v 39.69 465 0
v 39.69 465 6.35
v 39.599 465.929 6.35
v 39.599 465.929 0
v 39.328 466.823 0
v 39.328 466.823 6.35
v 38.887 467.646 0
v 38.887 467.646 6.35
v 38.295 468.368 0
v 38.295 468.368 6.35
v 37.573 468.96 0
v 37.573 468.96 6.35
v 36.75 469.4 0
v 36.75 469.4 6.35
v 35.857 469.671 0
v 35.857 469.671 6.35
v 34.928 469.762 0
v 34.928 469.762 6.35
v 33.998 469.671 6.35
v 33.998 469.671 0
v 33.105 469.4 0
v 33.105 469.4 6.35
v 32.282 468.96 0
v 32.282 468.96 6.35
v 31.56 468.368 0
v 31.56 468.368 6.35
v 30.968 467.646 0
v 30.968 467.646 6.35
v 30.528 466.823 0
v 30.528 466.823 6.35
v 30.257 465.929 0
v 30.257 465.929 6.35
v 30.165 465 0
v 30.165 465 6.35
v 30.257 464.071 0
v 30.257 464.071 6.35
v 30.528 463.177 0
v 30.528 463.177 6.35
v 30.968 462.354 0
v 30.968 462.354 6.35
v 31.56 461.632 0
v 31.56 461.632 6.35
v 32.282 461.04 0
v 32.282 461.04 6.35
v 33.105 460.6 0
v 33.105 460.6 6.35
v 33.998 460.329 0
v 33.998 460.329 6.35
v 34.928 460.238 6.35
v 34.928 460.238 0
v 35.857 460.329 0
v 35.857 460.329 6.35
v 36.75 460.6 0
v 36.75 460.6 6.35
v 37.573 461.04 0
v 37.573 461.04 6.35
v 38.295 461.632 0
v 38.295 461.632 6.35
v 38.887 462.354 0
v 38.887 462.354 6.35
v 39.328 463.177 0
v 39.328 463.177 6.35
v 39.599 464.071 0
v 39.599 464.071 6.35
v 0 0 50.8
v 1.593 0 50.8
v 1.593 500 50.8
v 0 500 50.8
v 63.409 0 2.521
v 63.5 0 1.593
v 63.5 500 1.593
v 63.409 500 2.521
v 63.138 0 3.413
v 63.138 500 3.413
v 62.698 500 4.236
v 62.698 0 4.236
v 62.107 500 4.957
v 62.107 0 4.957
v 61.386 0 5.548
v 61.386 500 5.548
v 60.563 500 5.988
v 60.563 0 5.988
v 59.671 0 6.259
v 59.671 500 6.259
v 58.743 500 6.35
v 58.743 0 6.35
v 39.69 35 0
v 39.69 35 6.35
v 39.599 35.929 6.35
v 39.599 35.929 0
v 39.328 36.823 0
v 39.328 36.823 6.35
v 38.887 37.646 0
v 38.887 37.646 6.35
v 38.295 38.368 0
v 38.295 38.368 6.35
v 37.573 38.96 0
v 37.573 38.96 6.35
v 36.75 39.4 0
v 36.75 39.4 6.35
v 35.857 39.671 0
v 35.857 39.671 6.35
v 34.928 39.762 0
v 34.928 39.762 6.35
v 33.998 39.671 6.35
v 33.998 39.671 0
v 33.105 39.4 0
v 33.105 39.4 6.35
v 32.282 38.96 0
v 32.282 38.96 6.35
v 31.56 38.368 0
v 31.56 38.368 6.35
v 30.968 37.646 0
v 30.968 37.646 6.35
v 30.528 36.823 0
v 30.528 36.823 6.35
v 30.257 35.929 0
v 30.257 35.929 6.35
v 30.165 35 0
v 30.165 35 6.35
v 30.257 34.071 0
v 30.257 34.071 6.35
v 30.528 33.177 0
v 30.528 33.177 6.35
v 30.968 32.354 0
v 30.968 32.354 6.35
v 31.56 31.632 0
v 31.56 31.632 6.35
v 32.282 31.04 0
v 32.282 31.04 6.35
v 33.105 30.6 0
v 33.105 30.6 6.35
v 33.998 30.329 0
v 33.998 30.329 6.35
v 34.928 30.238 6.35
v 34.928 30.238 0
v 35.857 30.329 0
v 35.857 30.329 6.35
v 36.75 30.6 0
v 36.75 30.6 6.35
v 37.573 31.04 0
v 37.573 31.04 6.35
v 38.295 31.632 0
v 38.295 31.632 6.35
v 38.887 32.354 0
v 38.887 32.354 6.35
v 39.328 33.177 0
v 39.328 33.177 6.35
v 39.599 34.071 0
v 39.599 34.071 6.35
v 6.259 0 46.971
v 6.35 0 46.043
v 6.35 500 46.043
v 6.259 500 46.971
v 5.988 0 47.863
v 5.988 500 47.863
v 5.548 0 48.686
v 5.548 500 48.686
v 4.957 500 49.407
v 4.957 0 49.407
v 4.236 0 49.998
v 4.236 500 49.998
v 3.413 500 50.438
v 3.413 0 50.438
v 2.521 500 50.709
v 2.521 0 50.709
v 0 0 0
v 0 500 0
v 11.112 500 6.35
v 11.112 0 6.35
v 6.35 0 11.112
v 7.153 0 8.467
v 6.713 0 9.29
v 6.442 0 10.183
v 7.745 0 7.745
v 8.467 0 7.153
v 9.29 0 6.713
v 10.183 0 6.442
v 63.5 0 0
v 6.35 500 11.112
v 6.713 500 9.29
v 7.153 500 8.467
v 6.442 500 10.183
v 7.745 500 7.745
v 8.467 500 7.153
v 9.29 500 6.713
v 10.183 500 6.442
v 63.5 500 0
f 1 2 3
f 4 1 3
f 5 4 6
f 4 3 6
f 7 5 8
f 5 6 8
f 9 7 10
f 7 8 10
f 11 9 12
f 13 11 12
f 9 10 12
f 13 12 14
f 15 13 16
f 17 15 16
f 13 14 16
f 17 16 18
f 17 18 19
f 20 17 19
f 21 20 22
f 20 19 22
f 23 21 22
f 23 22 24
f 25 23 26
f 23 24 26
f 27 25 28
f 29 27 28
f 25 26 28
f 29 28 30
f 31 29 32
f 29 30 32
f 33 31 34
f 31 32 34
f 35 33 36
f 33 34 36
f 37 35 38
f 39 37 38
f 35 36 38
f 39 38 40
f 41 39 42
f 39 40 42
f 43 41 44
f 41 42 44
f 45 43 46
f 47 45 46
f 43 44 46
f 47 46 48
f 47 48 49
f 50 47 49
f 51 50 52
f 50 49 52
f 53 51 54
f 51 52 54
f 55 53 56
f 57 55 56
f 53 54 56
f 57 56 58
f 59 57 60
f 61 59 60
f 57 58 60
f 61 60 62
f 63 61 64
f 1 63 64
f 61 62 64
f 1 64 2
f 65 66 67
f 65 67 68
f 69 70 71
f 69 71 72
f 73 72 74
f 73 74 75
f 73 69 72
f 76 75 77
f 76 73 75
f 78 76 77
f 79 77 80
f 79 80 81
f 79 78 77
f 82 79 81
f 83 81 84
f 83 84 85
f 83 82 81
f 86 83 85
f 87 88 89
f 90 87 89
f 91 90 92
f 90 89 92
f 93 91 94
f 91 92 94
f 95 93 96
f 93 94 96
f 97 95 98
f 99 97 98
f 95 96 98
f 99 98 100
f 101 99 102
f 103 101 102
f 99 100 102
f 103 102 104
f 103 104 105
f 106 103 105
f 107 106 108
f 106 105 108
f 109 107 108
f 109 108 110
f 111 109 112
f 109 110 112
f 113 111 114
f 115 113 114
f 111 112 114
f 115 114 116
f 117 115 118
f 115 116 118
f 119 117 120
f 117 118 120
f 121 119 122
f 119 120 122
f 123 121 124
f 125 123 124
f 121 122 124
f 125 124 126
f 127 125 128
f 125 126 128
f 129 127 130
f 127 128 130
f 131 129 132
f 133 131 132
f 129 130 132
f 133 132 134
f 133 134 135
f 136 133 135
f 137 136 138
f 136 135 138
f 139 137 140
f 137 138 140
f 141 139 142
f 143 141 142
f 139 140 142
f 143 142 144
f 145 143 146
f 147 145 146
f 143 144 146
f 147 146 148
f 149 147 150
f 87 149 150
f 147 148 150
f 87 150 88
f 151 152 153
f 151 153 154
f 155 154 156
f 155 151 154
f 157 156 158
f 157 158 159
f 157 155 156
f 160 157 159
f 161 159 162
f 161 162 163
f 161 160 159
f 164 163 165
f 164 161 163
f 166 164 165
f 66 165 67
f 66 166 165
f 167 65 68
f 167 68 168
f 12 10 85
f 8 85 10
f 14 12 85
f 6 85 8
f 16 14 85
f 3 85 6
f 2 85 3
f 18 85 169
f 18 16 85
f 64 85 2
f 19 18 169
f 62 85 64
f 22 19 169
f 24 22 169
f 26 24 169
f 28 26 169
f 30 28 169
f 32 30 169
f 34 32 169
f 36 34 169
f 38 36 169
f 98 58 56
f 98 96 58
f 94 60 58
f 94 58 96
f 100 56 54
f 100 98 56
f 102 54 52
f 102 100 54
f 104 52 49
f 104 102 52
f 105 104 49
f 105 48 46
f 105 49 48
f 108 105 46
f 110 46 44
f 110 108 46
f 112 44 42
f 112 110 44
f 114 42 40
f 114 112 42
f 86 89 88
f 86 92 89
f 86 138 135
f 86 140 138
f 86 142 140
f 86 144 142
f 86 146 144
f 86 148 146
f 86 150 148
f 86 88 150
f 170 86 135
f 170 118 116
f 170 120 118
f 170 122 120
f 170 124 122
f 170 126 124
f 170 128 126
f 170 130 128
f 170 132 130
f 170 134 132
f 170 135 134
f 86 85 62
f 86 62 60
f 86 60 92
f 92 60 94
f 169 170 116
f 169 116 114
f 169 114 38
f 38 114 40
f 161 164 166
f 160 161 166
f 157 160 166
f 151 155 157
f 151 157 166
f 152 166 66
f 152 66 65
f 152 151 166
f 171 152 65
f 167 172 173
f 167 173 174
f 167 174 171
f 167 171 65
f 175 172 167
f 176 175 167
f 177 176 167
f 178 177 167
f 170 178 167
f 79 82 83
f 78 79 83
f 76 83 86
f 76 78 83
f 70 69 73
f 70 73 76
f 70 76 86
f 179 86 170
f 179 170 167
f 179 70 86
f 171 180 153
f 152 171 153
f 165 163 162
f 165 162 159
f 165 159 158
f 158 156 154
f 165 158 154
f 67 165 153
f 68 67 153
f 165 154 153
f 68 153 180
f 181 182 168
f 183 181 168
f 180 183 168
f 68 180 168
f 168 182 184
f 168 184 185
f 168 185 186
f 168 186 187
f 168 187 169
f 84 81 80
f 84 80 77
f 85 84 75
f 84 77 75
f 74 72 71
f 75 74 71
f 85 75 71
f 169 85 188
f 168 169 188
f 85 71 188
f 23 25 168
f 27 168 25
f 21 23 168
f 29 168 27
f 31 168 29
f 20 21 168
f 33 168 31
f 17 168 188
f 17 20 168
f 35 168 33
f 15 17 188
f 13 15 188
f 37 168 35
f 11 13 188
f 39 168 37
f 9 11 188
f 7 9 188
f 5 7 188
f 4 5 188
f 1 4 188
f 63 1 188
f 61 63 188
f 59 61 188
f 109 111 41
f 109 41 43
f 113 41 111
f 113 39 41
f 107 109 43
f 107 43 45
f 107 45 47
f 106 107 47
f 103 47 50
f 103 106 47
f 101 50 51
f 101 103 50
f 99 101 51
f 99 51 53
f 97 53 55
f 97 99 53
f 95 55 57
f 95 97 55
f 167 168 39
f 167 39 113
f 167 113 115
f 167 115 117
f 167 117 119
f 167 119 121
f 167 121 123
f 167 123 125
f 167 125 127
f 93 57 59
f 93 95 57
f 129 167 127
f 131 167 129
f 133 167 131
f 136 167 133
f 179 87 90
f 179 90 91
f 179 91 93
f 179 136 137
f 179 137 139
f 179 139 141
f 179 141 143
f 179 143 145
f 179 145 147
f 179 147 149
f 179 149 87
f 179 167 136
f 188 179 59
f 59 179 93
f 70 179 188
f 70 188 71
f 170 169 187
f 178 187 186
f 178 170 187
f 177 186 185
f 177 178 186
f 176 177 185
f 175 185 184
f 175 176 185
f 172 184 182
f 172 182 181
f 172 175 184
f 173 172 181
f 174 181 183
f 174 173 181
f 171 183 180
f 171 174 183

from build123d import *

# Parameters (mm, degrees)
NGULO_L_L2_5X2X0_25_1_DEPTH = 500
CROQUIS3_R                  = 4.7625
CORTAR_EXTRUIR1_DEPTH       = 6.35


with BuildPart() as part:
    # Sketch1 → Ángulo l L2.5X2X0.25(1) (new body)
    with BuildSketch(Plane.ZX):
        with BuildLine():
            Line((0, 0), (0, 63.5))
            Line((0, 63.5), (1.59258, 63.5))
            ThreePointArc((1.59258, 63.5), (4.956583943, 62.106583943), (6.35, 58.74258))
            Line((6.35, 58.74258), (6.35, 11.1125))
            ThreePointArc((6.35, 11.1125), (7.744903955, 7.744903955), (11.1125, 6.35))
            Line((11.1125, 6.35), (46.04258, 6.35))
            ThreePointArc((46.04258, 6.35), (49.406583943, 4.956583943), (50.8, 1.59258))
            Line((50.8, 1.59258), (50.8, 0))
            Line((50.8, 0), (0, 0))
        make_face()
    extrude(amount=NGULO_L_L2_5X2X0_25_1_DEPTH)

    # Croquis3 → Cortar-Extruir1 (cut)
    with BuildSketch(Plane.XY.offset(6.35)):
        with Locations((34.92754, 465)):
            Circle(CROQUIS3_R)
        with Locations((34.92754, 35)):
            Circle(CROQUIS3_R)
    extrude(amount=-CORTAR_EXTRUIR1_DEPTH, mode=Mode.SUBTRACT)


solid = part.part
